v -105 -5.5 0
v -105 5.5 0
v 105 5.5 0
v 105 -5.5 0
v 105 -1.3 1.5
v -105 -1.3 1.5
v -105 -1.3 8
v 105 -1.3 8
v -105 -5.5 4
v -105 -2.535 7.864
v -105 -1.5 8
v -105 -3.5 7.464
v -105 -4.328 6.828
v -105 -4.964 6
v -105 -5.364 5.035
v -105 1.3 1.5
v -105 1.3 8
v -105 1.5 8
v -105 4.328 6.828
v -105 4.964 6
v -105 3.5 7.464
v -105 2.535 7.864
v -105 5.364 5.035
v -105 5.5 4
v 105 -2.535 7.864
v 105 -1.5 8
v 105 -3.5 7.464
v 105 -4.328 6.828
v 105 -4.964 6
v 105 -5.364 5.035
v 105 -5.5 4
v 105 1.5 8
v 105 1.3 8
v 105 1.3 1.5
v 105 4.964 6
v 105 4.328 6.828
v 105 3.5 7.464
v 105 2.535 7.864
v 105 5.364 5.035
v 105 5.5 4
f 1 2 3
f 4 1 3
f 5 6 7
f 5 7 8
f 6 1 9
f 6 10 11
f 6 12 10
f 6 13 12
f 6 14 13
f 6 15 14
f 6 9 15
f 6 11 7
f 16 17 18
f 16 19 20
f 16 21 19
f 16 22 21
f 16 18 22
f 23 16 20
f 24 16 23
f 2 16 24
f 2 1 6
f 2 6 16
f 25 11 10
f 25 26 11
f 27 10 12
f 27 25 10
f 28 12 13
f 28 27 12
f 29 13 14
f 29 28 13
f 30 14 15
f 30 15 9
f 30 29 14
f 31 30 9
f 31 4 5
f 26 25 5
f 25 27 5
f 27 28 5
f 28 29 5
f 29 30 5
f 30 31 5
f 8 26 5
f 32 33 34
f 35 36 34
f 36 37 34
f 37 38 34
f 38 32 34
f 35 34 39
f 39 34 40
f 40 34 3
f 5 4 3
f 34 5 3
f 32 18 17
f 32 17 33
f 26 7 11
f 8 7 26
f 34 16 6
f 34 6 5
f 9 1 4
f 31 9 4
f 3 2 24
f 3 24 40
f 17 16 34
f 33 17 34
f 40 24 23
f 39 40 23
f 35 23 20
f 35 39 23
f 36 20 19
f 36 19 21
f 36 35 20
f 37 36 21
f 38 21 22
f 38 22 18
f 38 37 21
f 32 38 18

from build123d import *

# Parameters (mm, degrees)
F0_W     = 210
F0_H     = 2.6
F1_DEPTH = 1.5
F0_H_2   = 4.2
F2_DEPTH = 8
F3_R     = 4


with BuildPart() as f1:
    # F0 (on Top) → F1 (new body)
    with BuildSketch(Plane.XY):
        Rectangle(F0_W, F0_H)
    extrude(amount=F1_DEPTH)

    # F0 (on Top) → F2 (join)
    with BuildSketch(Plane.XY):
        with Locations((0, 3.4)):
            Rectangle(F0_W, F0_H_2)
        with Locations((0, -3.4)):
            Rectangle(F0_W, F0_H_2)
    extrude(amount=F2_DEPTH)

    # F3
    f3_edges = [f1.edges().sort_by_distance(p)[0] for p in [
        (0, 5.5, 8),
        (0, -5.5, 8),
    ]]
    fillet(f3_edges, radius=F3_R)


solid = f1.part
